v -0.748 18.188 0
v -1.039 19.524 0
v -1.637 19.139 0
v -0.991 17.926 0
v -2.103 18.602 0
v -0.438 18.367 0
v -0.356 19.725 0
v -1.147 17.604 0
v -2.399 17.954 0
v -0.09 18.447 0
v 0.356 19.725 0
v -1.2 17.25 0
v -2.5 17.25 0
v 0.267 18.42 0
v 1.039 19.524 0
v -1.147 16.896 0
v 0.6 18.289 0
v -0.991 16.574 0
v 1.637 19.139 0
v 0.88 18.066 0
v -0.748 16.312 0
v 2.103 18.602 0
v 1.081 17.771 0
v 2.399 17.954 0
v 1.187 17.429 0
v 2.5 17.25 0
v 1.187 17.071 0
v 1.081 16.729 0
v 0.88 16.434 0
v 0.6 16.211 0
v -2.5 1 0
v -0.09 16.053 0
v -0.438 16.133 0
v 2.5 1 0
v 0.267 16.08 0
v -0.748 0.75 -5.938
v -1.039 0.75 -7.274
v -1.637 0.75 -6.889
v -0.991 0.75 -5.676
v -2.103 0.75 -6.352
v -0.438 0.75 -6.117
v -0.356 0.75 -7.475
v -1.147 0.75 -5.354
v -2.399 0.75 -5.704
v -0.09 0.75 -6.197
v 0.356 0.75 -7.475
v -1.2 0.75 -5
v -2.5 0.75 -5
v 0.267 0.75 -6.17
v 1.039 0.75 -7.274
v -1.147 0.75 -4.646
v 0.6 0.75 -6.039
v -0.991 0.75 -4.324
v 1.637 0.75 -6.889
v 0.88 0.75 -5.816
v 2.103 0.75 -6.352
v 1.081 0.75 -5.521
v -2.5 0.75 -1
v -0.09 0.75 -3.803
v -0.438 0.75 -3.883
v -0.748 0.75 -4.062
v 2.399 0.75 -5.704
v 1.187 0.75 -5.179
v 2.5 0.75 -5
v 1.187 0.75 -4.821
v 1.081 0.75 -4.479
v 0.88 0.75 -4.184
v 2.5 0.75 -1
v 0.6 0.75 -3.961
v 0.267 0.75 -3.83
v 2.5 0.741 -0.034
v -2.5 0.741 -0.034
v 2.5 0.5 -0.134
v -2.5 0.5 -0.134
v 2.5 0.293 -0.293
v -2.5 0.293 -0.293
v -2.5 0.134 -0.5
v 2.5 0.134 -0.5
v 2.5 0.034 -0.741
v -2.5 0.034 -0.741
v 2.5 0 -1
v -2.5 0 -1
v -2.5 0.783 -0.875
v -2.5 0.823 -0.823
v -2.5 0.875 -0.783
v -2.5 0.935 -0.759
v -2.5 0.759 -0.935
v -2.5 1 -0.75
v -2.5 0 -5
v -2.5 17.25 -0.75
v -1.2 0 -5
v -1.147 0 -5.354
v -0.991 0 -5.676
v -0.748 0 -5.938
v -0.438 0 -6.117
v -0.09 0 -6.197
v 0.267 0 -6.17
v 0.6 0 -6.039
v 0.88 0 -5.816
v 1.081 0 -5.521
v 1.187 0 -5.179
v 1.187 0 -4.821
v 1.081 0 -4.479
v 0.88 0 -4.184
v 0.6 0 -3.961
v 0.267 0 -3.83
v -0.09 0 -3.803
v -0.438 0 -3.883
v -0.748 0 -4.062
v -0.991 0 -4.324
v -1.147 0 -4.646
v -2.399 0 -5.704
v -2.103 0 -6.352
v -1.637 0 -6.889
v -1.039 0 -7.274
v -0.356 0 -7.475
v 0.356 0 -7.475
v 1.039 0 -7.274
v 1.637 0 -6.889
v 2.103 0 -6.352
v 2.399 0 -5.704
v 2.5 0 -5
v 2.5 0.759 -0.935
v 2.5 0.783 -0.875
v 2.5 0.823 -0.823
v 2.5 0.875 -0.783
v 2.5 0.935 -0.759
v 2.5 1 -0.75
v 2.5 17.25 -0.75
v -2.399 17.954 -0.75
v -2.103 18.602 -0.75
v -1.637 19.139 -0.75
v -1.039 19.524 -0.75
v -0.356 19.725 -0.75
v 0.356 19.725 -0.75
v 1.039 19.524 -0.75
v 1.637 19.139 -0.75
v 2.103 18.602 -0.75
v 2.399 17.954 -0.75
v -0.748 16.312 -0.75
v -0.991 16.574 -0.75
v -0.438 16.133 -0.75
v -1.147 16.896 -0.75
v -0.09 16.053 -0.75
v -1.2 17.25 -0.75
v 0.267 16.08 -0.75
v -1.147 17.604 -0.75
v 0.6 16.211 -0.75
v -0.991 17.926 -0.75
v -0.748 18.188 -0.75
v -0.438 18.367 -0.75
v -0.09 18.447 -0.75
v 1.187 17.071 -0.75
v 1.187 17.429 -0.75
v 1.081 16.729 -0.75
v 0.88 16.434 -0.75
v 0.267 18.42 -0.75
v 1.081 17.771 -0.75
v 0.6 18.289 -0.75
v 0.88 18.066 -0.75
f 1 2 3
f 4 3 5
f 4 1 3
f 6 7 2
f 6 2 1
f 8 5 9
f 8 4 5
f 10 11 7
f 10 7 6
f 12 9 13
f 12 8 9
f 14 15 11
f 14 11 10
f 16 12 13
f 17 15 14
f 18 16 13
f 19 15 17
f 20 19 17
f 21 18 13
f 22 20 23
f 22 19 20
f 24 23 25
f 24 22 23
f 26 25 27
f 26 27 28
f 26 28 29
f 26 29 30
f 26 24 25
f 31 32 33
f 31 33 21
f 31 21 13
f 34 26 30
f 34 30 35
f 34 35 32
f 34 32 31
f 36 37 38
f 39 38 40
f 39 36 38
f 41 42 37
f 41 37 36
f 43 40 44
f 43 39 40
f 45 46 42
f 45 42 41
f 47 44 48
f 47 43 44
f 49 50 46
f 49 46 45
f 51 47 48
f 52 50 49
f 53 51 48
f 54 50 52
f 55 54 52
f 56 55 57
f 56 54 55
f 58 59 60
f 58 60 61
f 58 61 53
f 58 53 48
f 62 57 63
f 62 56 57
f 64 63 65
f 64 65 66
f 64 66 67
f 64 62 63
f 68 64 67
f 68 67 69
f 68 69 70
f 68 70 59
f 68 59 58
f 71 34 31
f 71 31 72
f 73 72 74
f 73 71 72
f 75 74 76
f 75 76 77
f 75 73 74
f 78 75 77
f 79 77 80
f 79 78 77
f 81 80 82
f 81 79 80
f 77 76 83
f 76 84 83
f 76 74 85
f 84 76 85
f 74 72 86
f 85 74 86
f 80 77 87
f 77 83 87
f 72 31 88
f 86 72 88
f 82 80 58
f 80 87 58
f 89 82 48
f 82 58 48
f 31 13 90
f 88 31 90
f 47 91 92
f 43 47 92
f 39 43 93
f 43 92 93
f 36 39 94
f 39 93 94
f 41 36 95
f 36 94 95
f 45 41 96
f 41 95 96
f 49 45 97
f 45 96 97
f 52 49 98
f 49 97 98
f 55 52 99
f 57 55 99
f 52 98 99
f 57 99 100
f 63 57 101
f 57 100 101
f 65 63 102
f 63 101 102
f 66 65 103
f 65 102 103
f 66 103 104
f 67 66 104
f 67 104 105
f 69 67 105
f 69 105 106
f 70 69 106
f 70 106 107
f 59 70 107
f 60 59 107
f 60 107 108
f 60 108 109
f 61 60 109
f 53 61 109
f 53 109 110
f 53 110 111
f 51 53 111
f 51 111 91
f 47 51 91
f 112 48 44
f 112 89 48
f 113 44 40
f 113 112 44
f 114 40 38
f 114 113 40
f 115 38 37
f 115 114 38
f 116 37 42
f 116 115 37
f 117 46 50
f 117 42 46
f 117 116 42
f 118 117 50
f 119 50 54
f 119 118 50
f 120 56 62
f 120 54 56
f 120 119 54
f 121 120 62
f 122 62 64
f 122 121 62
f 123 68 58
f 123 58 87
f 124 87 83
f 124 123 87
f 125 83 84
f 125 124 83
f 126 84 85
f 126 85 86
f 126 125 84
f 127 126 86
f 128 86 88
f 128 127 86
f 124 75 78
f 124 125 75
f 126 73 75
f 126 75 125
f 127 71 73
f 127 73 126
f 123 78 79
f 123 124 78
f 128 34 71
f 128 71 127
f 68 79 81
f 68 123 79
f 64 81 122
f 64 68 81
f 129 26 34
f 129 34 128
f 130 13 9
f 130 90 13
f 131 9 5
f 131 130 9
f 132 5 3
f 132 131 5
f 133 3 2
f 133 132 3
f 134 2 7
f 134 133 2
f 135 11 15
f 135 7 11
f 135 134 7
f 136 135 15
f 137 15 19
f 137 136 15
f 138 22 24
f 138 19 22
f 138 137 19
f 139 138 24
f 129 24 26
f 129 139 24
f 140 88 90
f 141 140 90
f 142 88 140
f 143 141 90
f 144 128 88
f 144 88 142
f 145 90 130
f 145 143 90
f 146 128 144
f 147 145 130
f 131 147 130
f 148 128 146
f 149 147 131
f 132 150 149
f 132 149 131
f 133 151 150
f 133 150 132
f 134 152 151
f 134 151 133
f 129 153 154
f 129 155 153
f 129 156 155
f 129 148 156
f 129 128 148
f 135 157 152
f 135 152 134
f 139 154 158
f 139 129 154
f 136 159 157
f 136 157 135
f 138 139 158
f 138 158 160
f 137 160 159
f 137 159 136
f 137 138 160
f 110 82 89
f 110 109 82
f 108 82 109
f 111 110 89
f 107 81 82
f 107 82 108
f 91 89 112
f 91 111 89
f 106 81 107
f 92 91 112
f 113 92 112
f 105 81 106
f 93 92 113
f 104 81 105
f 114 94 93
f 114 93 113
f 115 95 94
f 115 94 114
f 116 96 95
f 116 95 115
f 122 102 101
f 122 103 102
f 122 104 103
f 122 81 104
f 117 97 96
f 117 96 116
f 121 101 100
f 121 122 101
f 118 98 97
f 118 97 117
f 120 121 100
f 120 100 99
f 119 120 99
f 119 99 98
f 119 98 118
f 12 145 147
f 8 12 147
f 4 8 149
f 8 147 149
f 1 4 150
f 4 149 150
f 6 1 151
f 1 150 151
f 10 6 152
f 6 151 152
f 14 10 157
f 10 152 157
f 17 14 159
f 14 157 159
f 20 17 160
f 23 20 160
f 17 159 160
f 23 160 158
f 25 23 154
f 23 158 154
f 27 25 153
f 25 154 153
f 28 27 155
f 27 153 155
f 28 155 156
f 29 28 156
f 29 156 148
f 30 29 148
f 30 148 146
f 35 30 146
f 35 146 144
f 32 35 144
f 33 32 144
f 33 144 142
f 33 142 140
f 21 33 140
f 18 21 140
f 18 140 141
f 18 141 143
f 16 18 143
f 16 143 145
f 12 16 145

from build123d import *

# Parameters (mm, degrees)
BASE_FLANGE1_DEPTH       = 2.5
FILLET1_RADIUS           = 2.5
FILLET1_LENGTH           = 0.75
FILLET2_RADIUS           = 2.5
FILLET2_LENGTH           = 0.75
M2_CLEARANCE_HOLE1_D     = 2.4
M2_CLEARANCE_HOLE1_DEPTH = 6
M2_CLEARANCE_HOLE1_TIP   = 0.721032743
M2_CLEARANCE_HOLE2_D     = 2.4
M2_CLEARANCE_HOLE2_DEPTH = 6
M2_CLEARANCE_HOLE2_TIP   = 0.721032743


# Sheet-metal steps are written as plain solids
with BuildPart() as part:
    # Sketch1 → Base-Flange1 (new, symmetric)
    with BuildSketch(Plane(origin=(0, 0, 0), x_dir=(0, 0, -1), z_dir=(1, 0, 0))):
        with BuildLine():
            Line((0, 19.75), (0, 1))
            ThreePointArc((0, 1), (0.292893219, 0.292893219), (1, 0))
            Line((1, 0), (7.5, 0))
            Line((7.5, 0), (7.5, 0.75))
            Line((7.5, 0.75), (1, 0.75))
            ThreePointArc((1, 0.75), (0.823223305, 0.823223305), (0.75, 1))
            Line((0.75, 1), (0.75, 19.75))
            Line((0.75, 19.75), (0, 19.75))
        make_face()
    extrude(amount=BASE_FLANGE1_DEPTH, both=True)

    # Fillet1: full round fillet: the end face becomes a half cylinder, R = half its width
    fillet1_face = Plane((0, 0.375, -7.5), x_dir=(0, -1, 0), z_dir=(0, 0, -1))  # on the end face: x along it, z out of the body
    fillet1_slab = fillet1_face.offset(-FILLET1_RADIUS / 2) * Box(FILLET1_LENGTH, 2 * FILLET1_RADIUS, FILLET1_RADIUS, mode=Mode.PRIVATE)  # the body's end, R deep
    fillet1_round = Plane((0, 0.375, -5), x_dir=(0, 0, -1), z_dir=(0, -1, 0)) * Cylinder(FILLET1_RADIUS, FILLET1_LENGTH, mode=Mode.PRIVATE)  # its axis R under the face
    add(fillet1_slab - fillet1_round, mode=Mode.SUBTRACT)

    # Fillet2: full round fillet: the end face becomes a half cylinder, R = half its width
    fillet2_face = Plane((0, 19.75, -0.375), x_dir=(0, 0, -1), z_dir=(0, 1, 0))  # on the end face: x along it, z out of the body
    fillet2_slab = fillet2_face.offset(-FILLET2_RADIUS / 2) * Box(FILLET2_LENGTH, 2 * FILLET2_RADIUS, FILLET2_RADIUS, mode=Mode.PRIVATE)  # the body's end, R deep
    fillet2_round = Plane((0, 17.25, -0.375), x_dir=(0, 1, 0), z_dir=(0, 0, -1)) * Cylinder(FILLET2_RADIUS, FILLET2_LENGTH, mode=Mode.PRIVATE)  # its axis R under the face
    add(fillet2_slab - fillet2_round, mode=Mode.SUBTRACT)

    # M2 Clearance Hole1
    with Locations(Plane.XY):
        with Locations((0, 17.25)):
            Hole(M2_CLEARANCE_HOLE1_D / 2, depth=M2_CLEARANCE_HOLE1_DEPTH)
            with Locations((0, 0, -(M2_CLEARANCE_HOLE1_DEPTH + M2_CLEARANCE_HOLE1_TIP / 2))):  # 118° drill point
                Cone(0, M2_CLEARANCE_HOLE1_D / 2, M2_CLEARANCE_HOLE1_TIP, mode=Mode.SUBTRACT)

    # M2 Clearance Hole2
    with Locations(Plane(origin=(0, 0.75, 0), x_dir=(1, 0, 0), z_dir=(0, 1, 0))):
        with Locations((0, 5)):
            Hole(M2_CLEARANCE_HOLE2_D / 2, depth=M2_CLEARANCE_HOLE2_DEPTH)
            with Locations((0, 0, -(M2_CLEARANCE_HOLE2_DEPTH + M2_CLEARANCE_HOLE2_TIP / 2))):  # 118° drill point
                Cone(0, M2_CLEARANCE_HOLE2_D / 2, M2_CLEARANCE_HOLE2_TIP, mode=Mode.SUBTRACT)


solid = part.part
